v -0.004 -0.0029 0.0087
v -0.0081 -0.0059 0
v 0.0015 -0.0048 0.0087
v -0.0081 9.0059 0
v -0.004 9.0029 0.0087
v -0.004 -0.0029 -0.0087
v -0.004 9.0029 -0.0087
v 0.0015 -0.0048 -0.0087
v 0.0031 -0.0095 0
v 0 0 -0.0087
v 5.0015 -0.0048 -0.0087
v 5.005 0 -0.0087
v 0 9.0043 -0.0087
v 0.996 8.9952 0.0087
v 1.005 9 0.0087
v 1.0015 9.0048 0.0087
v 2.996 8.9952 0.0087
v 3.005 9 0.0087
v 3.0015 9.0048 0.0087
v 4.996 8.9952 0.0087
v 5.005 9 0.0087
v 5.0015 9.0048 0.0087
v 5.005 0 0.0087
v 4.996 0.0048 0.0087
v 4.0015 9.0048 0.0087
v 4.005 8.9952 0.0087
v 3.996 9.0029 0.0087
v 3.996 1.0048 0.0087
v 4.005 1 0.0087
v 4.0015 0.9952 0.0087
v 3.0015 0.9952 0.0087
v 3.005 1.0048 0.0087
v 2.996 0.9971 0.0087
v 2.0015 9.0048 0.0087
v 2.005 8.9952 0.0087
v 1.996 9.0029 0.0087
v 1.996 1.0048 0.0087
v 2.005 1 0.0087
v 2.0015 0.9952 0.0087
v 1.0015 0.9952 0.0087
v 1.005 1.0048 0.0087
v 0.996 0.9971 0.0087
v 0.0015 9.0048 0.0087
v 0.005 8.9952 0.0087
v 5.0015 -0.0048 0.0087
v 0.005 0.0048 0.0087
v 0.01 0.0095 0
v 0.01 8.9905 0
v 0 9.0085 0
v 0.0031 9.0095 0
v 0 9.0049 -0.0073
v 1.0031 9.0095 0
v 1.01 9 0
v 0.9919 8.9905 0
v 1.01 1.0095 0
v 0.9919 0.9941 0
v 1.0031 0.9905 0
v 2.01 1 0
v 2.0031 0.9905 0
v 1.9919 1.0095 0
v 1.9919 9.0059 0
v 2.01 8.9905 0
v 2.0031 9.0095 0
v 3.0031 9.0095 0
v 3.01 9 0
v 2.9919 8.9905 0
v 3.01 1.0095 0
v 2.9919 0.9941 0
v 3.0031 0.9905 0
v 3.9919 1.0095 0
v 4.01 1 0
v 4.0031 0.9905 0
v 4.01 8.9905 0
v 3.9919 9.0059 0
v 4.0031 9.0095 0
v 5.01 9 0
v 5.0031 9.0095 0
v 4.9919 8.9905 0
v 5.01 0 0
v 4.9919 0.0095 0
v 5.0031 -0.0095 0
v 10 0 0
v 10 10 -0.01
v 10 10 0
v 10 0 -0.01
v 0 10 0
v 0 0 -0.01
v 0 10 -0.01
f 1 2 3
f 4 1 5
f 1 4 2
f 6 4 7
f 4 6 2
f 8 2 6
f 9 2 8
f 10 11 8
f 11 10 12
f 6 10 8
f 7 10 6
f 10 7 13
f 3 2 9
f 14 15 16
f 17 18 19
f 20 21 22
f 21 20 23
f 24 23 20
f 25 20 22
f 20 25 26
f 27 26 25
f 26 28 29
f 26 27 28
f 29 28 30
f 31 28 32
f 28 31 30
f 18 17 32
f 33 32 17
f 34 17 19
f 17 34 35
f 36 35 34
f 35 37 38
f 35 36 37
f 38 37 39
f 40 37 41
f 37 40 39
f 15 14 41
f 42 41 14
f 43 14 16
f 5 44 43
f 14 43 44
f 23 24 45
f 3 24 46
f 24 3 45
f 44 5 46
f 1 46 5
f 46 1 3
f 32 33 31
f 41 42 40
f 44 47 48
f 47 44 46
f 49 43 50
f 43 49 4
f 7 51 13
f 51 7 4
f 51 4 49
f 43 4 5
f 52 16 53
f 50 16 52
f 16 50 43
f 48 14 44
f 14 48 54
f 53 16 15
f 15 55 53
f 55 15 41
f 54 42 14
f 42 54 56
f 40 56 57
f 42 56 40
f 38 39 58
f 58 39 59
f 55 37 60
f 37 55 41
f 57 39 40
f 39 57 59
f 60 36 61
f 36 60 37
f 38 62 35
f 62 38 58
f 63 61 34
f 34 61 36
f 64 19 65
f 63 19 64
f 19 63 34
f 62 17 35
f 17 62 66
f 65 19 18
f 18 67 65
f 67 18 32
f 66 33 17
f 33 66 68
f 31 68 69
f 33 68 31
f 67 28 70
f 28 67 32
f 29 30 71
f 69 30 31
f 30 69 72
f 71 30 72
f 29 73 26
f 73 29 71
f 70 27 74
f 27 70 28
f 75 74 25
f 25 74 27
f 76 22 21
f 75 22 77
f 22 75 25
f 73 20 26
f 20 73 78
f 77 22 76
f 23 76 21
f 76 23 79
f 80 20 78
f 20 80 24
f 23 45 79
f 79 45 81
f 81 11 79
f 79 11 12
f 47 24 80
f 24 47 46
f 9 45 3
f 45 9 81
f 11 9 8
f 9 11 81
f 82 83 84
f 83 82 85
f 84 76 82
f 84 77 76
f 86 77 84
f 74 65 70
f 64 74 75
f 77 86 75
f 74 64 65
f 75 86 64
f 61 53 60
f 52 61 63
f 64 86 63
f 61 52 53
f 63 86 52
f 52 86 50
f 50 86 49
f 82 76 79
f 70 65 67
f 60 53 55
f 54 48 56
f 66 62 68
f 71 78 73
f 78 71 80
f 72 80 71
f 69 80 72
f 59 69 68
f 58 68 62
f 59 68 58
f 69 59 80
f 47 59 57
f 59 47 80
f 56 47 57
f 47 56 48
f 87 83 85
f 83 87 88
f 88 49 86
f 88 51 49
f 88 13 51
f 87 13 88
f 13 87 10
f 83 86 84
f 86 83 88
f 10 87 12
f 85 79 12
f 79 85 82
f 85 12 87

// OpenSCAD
hull(){
    translate([0.0, 0.0]) sphere(0.01);
    translate([0.0, 1.0]) sphere(0.01);
}
hull(){
    translate([0.0, 1.0]) sphere(0.01);
    translate([0.0, 2.0]) sphere(0.01);
}
hull(){
    translate([0.0, 2.0]) sphere(0.01);
    translate([0.0, 3.0]) sphere(0.01);
}
hull(){
    translate([0.0, 3.0]) sphere(0.01);
    translate([0.0, 4.0]) sphere(0.01);
}
hull(){
    translate([0.0, 4.0]) sphere(0.01);
    translate([0.0, 5.0]) sphere(0.01);
}
hull(){
    translate([0.0, 5.0]) sphere(0.01);
    translate([0.0, 6.0]) sphere(0.01);
}
hull(){
    translate([0.0, 6.0]) sphere(0.01);
    translate([0.0, 7.0]) sphere(0.01);
}
hull(){
    translate([0.0, 7.0]) sphere(0.01);
    translate([0.0, 8.0]) sphere(0.01);
}
hull(){
    translate([0.0, 8.0]) sphere(0.01);
    translate([0.0, 9.0]) sphere(0.01);
}
hull(){
    translate([0.0, 9.0]) sphere(0.01);
    translate([1.0, 9.0]) sphere(0.01);
}
hull(){
    translate([1.0, 9.0]) sphere(0.01);
    translate([1.0, 8.0]) sphere(0.01);
}
hull(){
    translate([1.0, 8.0]) sphere(0.01);
    translate([1.0, 7.0]) sphere(0.01);
}
hull(){
    translate([1.0, 7.0]) sphere(0.01);
    translate([1.0, 6.0]) sphere(0.01);
}
hull(){
    translate([1.0, 6.0]) sphere(0.01);
    translate([1.0, 5.0]) sphere(0.01);
}
hull(){
    translate([1.0, 5.0]) sphere(0.01);
    translate([1.0, 4.0]) sphere(0.01);
}
hull(){
    translate([1.0, 4.0]) sphere(0.01);
    translate([1.0, 3.0]) sphere(0.01);
}
hull(){
    translate([1.0, 3.0]) sphere(0.01);
    translate([1.0, 2.0]) sphere(0.01);
}
hull(){
    translate([1.0, 2.0]) sphere(0.01);
    translate([1.0, 1.0]) sphere(0.01);
}
hull(){
    translate([1.0, 1.0]) sphere(0.01);
    translate([2.0, 1.0]) sphere(0.01);
}
hull(){
    translate([2.0, 1.0]) sphere(0.01);
    translate([2.0, 2.0]) sphere(0.01);
}
hull(){
    translate([2.0, 2.0]) sphere(0.01);
    translate([2.0, 3.0]) sphere(0.01);
}
hull(){
    translate([2.0, 3.0]) sphere(0.01);
    translate([2.0, 4.0]) sphere(0.01);
}
hull(){
    translate([2.0, 4.0]) sphere(0.01);
    translate([2.0, 5.0]) sphere(0.01);
}
hull(){
    translate([2.0, 5.0]) sphere(0.01);
    translate([2.0, 6.0]) sphere(0.01);
}
hull(){
    translate([2.0, 6.0]) sphere(0.01);
    translate([2.0, 7.0]) sphere(0.01);
}
hull(){
    translate([2.0, 7.0]) sphere(0.01);
    translate([2.0, 8.0]) sphere(0.01);
}
hull(){
    translate([2.0, 8.0]) sphere(0.01);
    translate([2.0, 9.0]) sphere(0.01);
}
hull(){
    translate([2.0, 9.0]) sphere(0.01);
    translate([3.0, 9.0]) sphere(0.01);
}
hull(){
    translate([3.0, 9.0]) sphere(0.01);
    translate([3.0, 8.0]) sphere(0.01);
}
hull(){
    translate([3.0, 8.0]) sphere(0.01);
    translate([3.0, 7.0]) sphere(0.01);
}
hull(){
    translate([3.0, 7.0]) sphere(0.01);
    translate([3.0, 6.0]) sphere(0.01);
}
hull(){
    translate([3.0, 6.0]) sphere(0.01);
    translate([3.0, 5.0]) sphere(0.01);
}
hull(){
    translate([3.0, 5.0]) sphere(0.01);
    translate([3.0, 4.0]) sphere(0.01);
}
hull(){
    translate([3.0, 4.0]) sphere(0.01);
    translate([3.0, 3.0]) sphere(0.01);
}
hull(){
    translate([3.0, 3.0]) sphere(0.01);
    translate([3.0, 2.0]) sphere(0.01);
}
hull(){
    translate([3.0, 2.0]) sphere(0.01);
    translate([3.0, 1.0]) sphere(0.01);
}
hull(){
    translate([3.0, 1.0]) sphere(0.01);
    translate([4.0, 1.0]) sphere(0.01);
}
hull(){
    translate([4.0, 1.0]) sphere(0.01);
    translate([4.0, 2.0]) sphere(0.01);
}
hull(){
    translate([4.0, 2.0]) sphere(0.01);
    translate([4.0, 3.0]) sphere(0.01);
}
hull(){
    translate([4.0, 3.0]) sphere(0.01);
    translate([4.0, 4.0]) sphere(0.01);
}
hull(){
    translate([4.0, 4.0]) sphere(0.01);
    translate([4.0, 5.0]) sphere(0.01);
}
hull(){
    translate([4.0, 5.0]) sphere(0.01);
    translate([4.0, 6.0]) sphere(0.01);
}
hull(){
    translate([4.0, 6.0]) sphere(0.01);
    translate([4.0, 7.0]) sphere(0.01);
}
hull(){
    translate([4.0, 7.0]) sphere(0.01);
    translate([4.0, 8.0]) sphere(0.01);
}
hull(){
    translate([4.0, 8.0]) sphere(0.01);
    translate([4.0, 9.0]) sphere(0.01);
}
hull(){
    translate([4.0, 9.0]) sphere(0.01);
    translate([5.0, 9.0]) sphere(0.01);
}
hull(){
    translate([5.0, 9.0]) sphere(0.01);
    translate([5.0, 8.0]) sphere(0.01);
}
hull(){
    translate([5.0, 8.0]) sphere(0.01);
    translate([5.0, 7.0]) sphere(0.01);
}
hull(){
    translate([5.0, 7.0]) sphere(0.01);
    translate([5.0, 6.0]) sphere(0.01);
}
hull(){
    translate([5.0, 6.0]) sphere(0.01);
    translate([5.0, 5.0]) sphere(0.01);
}
hull(){
    translate([5.0, 5.0]) sphere(0.01);
    translate([5.0, 4.0]) sphere(0.01);
}
hull(){
    translate([5.0, 4.0]) sphere(0.01);
    translate([5.0, 3.0]) sphere(0.01);
}
hull(){
    translate([5.0, 3.0]) sphere(0.01);
    translate([5.0, 2.0]) sphere(0.01);
}
hull(){
    translate([5.0, 2.0]) sphere(0.01);
    translate([5.0, 1.0]) sphere(0.01);
}
hull(){
    translate([5.0, 1.0]) sphere(0.01);
    translate([5.0, 0.0]) sphere(0.01);
}
hull(){
    translate([5.0, 0.0]) sphere(0.01);
    translate([4.0, 0.0]) sphere(0.01);
}
hull(){
    translate([4.0, 0.0]) sphere(0.01);
    translate([3.0, 0.0]) sphere(0.01);
}
hull(){
    translate([3.0, 0.0]) sphere(0.01);
    translate([2.0, 0.0]) sphere(0.01);
}
hull(){
    translate([2.0, 0.0]) sphere(0.01);
    translate([1.0, 0.0]) sphere(0.01);
}
hull(){
    translate([1.0, 0.0]) sphere(0.01);
    translate([0.0, 0.0]) sphere(0.01);
}
translate([0,0,-0.01]) color([0.1,0.1,0.1]) cube([10,10,0.01]);
